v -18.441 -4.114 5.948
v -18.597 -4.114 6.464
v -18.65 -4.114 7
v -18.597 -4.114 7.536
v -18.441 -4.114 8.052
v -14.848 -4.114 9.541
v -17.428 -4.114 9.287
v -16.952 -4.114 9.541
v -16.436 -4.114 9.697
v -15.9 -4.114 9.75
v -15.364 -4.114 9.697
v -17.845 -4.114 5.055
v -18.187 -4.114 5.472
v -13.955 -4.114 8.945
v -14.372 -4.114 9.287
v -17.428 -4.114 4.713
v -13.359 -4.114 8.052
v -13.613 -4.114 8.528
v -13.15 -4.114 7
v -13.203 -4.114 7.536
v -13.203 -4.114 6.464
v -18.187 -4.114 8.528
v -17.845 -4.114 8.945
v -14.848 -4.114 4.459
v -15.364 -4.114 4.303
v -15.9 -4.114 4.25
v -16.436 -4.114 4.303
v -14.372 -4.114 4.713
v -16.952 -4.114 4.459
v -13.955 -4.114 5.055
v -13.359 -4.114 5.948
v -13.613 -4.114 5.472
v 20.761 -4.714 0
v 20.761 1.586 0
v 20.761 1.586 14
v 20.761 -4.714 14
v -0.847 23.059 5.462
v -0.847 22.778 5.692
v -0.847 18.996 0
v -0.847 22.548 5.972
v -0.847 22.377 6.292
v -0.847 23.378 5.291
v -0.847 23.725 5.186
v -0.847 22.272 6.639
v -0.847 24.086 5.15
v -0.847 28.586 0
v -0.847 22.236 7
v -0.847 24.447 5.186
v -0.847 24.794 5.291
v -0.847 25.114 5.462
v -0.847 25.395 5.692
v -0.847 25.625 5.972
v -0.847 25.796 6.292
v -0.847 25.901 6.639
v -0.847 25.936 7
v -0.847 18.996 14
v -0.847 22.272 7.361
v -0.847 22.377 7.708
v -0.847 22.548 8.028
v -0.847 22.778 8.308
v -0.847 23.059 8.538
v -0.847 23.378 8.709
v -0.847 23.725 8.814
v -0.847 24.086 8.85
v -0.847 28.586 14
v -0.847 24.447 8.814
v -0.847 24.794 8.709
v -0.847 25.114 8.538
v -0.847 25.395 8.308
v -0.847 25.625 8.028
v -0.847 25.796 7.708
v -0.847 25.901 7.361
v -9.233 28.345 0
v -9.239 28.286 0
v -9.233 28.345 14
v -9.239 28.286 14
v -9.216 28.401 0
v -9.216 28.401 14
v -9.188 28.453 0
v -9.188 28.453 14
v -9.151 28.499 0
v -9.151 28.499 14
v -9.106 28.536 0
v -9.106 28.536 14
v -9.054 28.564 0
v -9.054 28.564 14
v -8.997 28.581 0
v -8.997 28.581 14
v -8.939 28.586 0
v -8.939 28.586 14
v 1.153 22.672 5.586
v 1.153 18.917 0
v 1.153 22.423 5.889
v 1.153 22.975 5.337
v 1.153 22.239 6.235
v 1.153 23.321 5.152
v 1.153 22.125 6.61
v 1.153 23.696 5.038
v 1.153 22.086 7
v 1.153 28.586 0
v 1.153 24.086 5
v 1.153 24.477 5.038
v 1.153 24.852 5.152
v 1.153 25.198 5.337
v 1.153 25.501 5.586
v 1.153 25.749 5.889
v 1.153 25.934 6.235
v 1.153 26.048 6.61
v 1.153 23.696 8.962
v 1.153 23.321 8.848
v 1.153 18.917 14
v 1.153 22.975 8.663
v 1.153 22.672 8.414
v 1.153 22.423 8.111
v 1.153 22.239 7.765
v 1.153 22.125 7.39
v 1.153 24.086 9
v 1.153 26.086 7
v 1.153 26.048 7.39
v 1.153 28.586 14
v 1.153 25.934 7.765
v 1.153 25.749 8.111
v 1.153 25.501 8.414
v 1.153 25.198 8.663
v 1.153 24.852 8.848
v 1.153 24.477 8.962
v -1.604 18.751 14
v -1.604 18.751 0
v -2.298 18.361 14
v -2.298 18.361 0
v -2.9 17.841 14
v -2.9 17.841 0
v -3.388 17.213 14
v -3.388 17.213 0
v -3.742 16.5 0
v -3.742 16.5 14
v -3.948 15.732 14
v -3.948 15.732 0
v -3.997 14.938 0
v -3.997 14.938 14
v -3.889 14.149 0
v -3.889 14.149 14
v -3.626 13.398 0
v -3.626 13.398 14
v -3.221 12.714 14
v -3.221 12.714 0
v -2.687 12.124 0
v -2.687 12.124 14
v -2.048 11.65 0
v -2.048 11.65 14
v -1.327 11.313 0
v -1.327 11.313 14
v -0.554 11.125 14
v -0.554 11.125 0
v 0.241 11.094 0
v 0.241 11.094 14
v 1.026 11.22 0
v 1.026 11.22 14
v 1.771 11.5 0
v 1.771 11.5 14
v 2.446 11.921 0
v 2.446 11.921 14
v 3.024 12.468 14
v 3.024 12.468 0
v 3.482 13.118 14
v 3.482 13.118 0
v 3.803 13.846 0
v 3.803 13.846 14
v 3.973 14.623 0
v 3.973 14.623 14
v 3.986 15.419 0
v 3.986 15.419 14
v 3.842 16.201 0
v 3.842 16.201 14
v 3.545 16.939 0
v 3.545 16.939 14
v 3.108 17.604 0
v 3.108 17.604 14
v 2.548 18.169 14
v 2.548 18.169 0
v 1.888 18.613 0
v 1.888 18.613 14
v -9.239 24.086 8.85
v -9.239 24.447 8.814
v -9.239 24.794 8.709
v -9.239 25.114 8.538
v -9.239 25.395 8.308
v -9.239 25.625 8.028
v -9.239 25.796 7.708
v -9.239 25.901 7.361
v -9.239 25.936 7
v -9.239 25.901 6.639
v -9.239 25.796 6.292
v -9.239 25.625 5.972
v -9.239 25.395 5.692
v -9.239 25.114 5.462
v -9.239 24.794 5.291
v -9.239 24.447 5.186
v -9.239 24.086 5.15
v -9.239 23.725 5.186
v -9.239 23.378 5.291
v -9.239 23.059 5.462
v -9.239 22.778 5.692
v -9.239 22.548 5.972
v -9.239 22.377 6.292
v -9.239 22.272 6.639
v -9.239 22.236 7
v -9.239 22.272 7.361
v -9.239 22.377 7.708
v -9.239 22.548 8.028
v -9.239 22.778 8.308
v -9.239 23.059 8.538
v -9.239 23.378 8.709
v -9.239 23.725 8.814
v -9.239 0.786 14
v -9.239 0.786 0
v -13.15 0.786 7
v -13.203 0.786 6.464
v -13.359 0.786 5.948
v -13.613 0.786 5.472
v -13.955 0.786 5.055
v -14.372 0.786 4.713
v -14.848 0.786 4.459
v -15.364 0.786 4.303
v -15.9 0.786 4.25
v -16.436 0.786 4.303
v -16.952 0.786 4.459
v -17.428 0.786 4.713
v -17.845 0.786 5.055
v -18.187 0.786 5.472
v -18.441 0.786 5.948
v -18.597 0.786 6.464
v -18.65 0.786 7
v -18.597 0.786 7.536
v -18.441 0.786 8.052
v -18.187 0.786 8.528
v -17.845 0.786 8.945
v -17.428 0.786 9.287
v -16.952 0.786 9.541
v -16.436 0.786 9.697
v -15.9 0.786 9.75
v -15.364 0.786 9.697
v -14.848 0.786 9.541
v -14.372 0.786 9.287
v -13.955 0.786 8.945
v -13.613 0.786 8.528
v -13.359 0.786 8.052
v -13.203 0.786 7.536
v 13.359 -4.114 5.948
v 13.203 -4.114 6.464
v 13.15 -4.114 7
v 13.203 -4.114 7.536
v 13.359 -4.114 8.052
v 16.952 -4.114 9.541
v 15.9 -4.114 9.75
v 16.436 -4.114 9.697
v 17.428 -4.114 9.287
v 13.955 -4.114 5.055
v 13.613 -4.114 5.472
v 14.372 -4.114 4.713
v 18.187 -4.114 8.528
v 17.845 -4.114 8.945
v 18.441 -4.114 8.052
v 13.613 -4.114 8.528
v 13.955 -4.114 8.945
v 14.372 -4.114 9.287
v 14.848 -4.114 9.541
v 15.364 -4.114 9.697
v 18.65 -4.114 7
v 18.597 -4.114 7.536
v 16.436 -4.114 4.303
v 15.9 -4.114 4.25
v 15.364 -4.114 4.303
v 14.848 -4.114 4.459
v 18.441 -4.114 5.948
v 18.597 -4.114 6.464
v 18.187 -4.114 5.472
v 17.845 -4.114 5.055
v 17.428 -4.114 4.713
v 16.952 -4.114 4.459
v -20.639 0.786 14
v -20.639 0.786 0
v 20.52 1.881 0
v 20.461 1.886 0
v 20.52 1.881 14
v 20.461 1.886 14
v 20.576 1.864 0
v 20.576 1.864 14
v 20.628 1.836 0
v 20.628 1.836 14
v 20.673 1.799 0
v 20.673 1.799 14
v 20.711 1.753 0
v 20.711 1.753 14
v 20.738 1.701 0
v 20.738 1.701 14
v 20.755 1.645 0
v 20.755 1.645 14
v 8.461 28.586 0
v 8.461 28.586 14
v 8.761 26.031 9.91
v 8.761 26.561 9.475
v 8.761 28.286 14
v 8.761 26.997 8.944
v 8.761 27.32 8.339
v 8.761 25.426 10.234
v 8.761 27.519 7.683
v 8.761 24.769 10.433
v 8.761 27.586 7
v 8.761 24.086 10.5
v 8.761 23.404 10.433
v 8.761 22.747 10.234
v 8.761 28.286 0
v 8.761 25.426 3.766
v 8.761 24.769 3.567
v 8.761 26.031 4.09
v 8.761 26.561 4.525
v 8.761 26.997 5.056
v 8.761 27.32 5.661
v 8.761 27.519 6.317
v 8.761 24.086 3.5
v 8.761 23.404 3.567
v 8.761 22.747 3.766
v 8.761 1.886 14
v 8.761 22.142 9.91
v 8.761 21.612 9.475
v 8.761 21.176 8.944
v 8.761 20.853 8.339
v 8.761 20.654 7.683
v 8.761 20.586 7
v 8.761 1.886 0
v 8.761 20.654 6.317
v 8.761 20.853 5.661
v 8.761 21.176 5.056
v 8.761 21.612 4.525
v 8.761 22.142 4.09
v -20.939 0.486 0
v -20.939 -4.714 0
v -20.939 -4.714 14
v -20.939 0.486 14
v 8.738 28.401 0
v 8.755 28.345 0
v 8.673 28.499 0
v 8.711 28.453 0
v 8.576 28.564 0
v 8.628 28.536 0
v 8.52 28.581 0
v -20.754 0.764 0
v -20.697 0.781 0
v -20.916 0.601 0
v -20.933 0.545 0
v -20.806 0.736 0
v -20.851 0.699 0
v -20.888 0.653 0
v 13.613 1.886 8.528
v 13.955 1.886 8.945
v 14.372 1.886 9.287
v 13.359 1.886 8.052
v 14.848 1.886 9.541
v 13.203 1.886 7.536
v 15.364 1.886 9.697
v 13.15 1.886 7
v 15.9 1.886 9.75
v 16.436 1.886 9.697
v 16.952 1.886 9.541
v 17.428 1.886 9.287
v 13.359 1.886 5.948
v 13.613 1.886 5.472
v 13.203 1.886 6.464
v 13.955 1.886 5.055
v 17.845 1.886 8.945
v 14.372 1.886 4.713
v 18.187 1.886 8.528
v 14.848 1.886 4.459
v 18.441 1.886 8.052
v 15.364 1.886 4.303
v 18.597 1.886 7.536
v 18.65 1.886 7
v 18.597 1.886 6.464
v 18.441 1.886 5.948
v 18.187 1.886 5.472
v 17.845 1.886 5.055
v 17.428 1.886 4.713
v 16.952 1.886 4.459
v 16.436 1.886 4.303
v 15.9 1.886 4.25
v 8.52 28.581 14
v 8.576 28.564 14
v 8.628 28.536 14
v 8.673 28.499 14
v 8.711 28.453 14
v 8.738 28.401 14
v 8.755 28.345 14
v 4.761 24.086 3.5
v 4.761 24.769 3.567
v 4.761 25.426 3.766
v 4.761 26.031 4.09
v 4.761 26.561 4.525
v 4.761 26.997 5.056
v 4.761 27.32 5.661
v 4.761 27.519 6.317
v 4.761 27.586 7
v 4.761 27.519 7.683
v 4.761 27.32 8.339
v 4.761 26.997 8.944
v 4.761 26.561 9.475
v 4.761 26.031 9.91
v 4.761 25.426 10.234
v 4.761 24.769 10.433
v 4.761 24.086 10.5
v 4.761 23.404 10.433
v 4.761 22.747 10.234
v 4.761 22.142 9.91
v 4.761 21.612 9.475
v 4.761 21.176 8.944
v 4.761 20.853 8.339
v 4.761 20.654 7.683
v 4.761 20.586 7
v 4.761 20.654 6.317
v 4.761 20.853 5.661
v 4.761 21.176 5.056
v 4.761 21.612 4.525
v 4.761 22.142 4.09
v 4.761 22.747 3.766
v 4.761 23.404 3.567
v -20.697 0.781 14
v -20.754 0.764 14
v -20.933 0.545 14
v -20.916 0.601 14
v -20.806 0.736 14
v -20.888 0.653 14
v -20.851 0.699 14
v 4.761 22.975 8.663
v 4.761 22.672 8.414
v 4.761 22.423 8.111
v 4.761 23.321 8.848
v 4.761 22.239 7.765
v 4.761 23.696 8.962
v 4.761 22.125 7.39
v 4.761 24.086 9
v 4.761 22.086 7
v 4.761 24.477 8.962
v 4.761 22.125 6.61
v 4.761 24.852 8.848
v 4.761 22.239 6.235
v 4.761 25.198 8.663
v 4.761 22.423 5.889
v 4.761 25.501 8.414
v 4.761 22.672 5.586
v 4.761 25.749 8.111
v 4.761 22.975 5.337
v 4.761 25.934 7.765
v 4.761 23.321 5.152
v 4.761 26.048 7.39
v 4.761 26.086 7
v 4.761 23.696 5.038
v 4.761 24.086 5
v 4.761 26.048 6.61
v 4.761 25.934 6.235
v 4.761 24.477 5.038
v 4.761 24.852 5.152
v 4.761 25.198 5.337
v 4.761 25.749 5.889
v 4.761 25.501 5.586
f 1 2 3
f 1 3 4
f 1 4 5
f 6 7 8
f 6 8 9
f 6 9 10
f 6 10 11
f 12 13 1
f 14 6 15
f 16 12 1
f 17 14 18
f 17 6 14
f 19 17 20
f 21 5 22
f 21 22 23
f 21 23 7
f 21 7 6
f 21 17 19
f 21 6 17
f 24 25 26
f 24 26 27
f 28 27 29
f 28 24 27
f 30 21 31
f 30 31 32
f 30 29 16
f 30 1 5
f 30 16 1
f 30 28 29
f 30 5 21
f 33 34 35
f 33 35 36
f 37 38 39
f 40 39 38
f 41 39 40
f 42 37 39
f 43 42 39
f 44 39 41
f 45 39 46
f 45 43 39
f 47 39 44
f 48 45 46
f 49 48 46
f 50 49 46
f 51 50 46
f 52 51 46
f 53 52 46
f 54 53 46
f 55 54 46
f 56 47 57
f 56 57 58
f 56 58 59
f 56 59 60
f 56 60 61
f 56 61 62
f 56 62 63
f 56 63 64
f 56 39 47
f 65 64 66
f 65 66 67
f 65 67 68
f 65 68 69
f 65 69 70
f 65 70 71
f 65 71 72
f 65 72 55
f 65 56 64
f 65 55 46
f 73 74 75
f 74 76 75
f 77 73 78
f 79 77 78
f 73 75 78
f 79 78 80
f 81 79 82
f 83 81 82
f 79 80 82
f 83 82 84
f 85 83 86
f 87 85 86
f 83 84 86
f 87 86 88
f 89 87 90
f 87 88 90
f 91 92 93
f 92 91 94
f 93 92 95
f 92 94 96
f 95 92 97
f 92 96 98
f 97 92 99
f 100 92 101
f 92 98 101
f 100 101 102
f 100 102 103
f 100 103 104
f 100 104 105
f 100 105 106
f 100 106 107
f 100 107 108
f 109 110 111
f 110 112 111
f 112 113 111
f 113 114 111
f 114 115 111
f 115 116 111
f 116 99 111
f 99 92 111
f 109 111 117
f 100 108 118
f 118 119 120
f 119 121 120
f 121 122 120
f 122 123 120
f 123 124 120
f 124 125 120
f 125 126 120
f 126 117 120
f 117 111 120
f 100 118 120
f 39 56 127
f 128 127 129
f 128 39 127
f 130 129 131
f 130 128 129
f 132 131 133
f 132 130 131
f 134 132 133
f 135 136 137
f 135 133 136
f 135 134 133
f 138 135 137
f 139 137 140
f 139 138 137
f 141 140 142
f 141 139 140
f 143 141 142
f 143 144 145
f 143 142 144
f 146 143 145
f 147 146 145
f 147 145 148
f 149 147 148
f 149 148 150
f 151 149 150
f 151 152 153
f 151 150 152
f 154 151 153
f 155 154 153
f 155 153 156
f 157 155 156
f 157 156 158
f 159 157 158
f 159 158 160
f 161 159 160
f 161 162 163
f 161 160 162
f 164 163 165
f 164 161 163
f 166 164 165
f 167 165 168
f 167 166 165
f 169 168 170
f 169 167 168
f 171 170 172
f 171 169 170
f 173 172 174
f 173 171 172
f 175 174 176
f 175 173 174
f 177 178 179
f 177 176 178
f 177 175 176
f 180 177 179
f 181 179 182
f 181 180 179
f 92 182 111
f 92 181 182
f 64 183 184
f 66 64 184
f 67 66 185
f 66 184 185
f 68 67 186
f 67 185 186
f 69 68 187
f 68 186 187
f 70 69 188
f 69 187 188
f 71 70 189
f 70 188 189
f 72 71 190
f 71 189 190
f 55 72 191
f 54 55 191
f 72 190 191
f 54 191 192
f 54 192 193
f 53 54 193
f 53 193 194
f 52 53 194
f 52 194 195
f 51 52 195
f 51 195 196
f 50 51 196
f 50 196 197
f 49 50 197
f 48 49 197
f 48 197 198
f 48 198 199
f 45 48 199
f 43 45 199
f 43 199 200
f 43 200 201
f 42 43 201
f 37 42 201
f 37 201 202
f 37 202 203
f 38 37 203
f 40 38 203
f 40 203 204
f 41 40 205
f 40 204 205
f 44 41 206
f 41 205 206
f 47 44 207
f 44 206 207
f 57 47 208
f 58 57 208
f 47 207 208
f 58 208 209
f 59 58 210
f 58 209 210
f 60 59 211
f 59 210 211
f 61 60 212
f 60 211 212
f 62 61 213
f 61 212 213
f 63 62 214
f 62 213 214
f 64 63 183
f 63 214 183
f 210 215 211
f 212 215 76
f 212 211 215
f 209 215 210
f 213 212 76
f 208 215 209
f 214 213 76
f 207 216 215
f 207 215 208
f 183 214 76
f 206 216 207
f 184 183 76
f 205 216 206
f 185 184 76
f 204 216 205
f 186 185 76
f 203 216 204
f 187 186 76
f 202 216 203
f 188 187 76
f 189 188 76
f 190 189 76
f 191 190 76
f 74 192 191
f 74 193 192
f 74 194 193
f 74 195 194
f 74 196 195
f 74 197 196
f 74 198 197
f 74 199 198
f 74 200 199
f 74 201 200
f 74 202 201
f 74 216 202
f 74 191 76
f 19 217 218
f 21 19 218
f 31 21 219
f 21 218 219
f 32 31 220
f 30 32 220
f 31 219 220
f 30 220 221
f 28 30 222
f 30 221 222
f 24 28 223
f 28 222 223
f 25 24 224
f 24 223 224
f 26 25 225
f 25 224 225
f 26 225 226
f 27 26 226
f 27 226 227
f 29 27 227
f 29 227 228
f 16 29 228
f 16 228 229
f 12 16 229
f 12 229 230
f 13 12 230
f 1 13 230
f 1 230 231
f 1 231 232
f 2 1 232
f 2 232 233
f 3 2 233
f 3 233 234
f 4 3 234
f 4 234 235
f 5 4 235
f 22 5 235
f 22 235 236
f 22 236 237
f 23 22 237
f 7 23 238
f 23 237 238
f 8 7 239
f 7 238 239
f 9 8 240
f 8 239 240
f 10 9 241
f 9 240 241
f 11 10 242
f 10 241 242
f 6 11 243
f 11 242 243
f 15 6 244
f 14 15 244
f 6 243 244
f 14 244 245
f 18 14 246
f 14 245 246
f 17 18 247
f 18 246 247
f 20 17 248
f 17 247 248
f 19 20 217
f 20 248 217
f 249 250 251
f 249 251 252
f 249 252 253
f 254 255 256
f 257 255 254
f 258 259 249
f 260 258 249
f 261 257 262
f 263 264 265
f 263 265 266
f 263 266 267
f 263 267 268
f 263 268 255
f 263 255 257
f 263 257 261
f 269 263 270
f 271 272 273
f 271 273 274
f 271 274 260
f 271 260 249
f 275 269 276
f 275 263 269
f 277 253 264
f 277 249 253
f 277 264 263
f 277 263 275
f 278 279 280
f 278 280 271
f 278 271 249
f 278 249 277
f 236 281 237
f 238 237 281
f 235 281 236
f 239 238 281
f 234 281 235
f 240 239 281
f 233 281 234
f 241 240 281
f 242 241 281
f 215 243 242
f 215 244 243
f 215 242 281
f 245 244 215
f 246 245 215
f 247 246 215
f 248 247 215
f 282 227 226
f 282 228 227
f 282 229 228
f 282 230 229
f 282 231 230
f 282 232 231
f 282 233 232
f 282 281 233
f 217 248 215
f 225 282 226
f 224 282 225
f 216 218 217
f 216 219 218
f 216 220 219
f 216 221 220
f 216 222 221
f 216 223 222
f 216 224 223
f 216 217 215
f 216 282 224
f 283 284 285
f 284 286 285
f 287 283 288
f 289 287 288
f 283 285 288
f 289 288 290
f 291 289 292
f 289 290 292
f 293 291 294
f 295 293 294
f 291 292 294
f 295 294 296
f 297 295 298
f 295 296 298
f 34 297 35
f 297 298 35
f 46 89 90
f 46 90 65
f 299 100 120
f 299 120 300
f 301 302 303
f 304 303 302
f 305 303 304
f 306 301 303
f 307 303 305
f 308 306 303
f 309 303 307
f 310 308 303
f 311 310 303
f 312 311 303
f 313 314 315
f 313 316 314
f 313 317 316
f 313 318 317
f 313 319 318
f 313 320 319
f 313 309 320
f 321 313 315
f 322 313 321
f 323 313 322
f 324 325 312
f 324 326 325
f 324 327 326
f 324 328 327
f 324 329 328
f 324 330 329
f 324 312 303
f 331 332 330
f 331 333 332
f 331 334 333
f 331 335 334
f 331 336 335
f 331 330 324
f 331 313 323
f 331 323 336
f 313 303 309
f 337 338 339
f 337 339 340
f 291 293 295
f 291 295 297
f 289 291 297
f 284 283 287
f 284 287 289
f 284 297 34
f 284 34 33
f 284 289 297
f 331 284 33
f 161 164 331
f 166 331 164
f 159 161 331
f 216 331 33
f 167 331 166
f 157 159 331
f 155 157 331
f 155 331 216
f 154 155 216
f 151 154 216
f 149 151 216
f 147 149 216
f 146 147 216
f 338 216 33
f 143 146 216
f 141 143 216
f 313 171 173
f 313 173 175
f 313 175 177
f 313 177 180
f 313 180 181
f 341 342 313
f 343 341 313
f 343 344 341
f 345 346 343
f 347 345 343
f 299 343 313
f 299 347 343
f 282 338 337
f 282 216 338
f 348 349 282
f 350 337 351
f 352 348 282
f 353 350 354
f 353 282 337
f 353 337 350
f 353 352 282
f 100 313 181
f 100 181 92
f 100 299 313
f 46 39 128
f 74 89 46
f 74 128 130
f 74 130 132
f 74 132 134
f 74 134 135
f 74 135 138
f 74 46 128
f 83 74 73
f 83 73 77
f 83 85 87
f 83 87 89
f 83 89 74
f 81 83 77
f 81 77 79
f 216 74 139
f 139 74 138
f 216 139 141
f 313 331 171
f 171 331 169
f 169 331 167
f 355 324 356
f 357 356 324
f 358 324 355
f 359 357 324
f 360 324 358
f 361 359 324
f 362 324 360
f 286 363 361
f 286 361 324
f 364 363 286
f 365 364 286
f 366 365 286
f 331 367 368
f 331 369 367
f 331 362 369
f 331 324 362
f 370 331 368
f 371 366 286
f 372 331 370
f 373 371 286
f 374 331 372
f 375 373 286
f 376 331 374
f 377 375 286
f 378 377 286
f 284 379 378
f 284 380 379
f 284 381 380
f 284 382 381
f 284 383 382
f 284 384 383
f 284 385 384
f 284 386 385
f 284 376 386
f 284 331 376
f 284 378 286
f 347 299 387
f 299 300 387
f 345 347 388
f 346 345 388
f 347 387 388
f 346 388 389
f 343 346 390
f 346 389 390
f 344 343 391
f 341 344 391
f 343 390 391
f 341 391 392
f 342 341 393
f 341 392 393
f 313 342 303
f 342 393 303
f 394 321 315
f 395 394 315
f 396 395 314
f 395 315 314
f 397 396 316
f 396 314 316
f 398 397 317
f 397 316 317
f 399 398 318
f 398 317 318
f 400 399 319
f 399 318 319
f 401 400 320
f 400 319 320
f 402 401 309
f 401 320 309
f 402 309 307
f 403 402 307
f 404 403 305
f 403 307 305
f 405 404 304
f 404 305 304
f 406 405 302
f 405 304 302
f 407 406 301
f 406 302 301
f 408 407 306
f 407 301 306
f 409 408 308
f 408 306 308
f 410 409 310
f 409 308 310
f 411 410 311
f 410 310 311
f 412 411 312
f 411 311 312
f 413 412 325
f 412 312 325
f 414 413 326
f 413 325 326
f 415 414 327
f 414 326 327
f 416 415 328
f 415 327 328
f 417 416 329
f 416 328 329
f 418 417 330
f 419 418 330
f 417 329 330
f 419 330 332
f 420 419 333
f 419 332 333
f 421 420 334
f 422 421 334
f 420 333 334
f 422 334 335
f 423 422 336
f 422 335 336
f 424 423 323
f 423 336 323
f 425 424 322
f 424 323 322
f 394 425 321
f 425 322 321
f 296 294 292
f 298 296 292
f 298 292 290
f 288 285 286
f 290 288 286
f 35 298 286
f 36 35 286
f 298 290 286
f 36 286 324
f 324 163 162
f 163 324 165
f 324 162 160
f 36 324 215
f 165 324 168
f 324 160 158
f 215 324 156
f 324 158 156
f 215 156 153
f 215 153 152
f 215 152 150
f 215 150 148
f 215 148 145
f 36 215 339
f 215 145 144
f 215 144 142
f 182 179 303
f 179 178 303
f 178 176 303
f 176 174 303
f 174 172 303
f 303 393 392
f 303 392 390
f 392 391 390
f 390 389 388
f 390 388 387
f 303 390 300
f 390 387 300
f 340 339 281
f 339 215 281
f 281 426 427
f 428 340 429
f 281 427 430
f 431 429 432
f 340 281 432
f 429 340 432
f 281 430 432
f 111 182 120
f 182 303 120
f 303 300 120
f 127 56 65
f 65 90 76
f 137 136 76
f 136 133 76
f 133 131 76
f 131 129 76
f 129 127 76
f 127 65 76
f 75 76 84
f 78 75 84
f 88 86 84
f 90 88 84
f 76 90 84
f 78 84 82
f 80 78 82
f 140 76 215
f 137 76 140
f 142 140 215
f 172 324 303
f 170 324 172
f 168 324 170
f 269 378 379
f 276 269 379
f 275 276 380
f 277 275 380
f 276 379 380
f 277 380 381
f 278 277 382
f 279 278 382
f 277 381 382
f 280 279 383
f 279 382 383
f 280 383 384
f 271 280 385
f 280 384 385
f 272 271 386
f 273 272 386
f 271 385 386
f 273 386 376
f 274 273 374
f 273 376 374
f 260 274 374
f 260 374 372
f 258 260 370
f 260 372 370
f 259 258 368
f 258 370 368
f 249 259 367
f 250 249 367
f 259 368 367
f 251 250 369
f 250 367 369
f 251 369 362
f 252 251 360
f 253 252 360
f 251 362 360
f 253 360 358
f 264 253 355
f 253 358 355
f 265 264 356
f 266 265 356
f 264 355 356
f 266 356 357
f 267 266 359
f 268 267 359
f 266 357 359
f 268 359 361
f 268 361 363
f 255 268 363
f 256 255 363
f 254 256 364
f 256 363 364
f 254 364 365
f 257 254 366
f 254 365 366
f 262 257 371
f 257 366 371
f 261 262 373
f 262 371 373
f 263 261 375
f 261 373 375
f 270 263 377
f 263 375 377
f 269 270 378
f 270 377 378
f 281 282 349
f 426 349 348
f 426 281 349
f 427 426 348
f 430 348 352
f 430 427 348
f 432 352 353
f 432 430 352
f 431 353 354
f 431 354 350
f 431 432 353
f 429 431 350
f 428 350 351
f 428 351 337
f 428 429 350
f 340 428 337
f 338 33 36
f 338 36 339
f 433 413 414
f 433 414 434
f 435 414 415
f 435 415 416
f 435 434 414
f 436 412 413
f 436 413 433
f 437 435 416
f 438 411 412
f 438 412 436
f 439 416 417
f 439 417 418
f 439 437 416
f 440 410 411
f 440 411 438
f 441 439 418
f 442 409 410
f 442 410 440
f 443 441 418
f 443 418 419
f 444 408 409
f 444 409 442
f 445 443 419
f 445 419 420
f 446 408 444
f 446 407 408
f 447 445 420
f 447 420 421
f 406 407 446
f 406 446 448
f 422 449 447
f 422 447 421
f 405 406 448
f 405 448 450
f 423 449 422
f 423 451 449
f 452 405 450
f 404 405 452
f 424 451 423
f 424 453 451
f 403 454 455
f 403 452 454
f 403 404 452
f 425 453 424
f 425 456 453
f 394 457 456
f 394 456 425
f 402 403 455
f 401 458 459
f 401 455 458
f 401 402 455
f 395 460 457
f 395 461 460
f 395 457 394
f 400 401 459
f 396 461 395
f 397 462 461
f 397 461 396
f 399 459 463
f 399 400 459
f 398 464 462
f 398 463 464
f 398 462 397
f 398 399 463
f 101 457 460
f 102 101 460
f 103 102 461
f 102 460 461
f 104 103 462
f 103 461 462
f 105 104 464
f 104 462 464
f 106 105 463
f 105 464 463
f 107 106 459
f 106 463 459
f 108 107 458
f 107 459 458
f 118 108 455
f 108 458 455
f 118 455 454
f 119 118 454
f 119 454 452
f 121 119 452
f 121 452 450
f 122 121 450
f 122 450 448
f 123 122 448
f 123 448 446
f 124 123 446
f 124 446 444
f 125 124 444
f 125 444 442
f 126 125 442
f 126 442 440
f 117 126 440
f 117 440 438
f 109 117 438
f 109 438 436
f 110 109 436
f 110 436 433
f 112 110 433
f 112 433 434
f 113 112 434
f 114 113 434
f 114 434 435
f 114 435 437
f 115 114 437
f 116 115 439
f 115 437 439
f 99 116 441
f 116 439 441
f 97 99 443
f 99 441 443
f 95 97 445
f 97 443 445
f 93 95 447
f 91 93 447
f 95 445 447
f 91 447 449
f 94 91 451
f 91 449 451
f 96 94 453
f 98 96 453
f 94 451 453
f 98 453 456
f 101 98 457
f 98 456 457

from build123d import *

# Parameters (mm, degrees)
SKETCH1_R           = 4
BOSS_EXTRUDE1_DEPTH = 14
SKETCH2_R           = 2.75
CUT_EXTRUDE1_DEPTH  = 6
SKETCH3_W           = 2
SKETCH3_H           = 11.620769134
CUT_EXTRUDE2_DEPTH  = 14
SKETCH4_R           = 2
CUT_EXTRUDE3_DEPTH  = 9
SKETCH5_R           = 3.5
CUT_EXTRUDE4_DEPTH  = 4
SKETCH6_R           = 1.85
CUT_EXTRUDE5_DEPTH  = 9
FILLET1_R           = 0.3


with BuildPart() as part:
    # Sketch1 → Boss-Extrude1 (new body)
    with BuildSketch(Plane.XY):
        Polygon((-20.938905162, 0.786403392), (-9.238905162, 0.786403392), (-9.238905162, 28.586403392), (8.761094838, 28.586403392), (8.761094838, 1.886403392), (20.761094838, 1.886403392), (20.761094838, -4.713596608), (-20.938905162, -4.713596608), align=None)
        with Locations((0, 15.086403392)):
            Circle(SKETCH1_R, mode=Mode.SUBTRACT)
    extrude(amount=BOSS_EXTRUDE1_DEPTH)

    # Sketch2 → Cut-Extrude1 (cut)
    with BuildSketch(Plane(origin=(0, 1.886403392, 0), x_dir=(1, 0, 0), z_dir=(0, 1, 0))):
        with Locations((-15.9, -7)):
            Circle(SKETCH2_R)
        with Locations((15.9, -7)):
            Circle(SKETCH2_R)
    extrude(amount=-CUT_EXTRUDE1_DEPTH, mode=Mode.SUBTRACT)

    # Sketch3 → Cut-Extrude2 (cut)
    with BuildSketch(Plane.XY.offset(14)):
        with Locations((0.152630001, 23.872597077)):
            Rectangle(SKETCH3_W, SKETCH3_H)
    extrude(amount=-CUT_EXTRUDE2_DEPTH, mode=Mode.SUBTRACT)

    # Sketch4 → Cut-Extrude3 (cut)
    with BuildSketch(Plane(origin=(8.761094838, 0, 0), x_dir=(0, 0, -1), z_dir=(1, 0, 0))):
        with Locations((-7, 24.086403392)):
            Circle(SKETCH4_R)
    extrude(amount=-CUT_EXTRUDE3_DEPTH, mode=Mode.SUBTRACT)

    # Sketch5 → Cut-Extrude4 (cut)
    with BuildSketch(Plane(origin=(8.761094838, 0, 0), x_dir=(0, 0, -1), z_dir=(1, 0, 0))):
        with Locations((-7, 24.086403392)):
            Circle(SKETCH5_R)
    extrude(amount=-CUT_EXTRUDE4_DEPTH, mode=Mode.SUBTRACT)

    # Sketch6 → Cut-Extrude5 (cut)
    with BuildSketch(Plane.ZY.offset(9.238905162)):
        with Locations((7, 24.086403392)):
            Circle(SKETCH6_R)
    extrude(amount=-CUT_EXTRUDE5_DEPTH, mode=Mode.SUBTRACT)

    # Fillet1
    fillet1_edges = [part.edges().sort_by_distance(p)[0] for p in [
        (-20.938905162, 0.786403392, 7),
        (-9.238905162, 28.586403392, 7),
        (8.761094838, 28.586403392, 7),
        (20.761094838, 1.886403392, 7),
    ]]
    fillet(fillet1_edges, radius=FILLET1_R)


solid = part.part
